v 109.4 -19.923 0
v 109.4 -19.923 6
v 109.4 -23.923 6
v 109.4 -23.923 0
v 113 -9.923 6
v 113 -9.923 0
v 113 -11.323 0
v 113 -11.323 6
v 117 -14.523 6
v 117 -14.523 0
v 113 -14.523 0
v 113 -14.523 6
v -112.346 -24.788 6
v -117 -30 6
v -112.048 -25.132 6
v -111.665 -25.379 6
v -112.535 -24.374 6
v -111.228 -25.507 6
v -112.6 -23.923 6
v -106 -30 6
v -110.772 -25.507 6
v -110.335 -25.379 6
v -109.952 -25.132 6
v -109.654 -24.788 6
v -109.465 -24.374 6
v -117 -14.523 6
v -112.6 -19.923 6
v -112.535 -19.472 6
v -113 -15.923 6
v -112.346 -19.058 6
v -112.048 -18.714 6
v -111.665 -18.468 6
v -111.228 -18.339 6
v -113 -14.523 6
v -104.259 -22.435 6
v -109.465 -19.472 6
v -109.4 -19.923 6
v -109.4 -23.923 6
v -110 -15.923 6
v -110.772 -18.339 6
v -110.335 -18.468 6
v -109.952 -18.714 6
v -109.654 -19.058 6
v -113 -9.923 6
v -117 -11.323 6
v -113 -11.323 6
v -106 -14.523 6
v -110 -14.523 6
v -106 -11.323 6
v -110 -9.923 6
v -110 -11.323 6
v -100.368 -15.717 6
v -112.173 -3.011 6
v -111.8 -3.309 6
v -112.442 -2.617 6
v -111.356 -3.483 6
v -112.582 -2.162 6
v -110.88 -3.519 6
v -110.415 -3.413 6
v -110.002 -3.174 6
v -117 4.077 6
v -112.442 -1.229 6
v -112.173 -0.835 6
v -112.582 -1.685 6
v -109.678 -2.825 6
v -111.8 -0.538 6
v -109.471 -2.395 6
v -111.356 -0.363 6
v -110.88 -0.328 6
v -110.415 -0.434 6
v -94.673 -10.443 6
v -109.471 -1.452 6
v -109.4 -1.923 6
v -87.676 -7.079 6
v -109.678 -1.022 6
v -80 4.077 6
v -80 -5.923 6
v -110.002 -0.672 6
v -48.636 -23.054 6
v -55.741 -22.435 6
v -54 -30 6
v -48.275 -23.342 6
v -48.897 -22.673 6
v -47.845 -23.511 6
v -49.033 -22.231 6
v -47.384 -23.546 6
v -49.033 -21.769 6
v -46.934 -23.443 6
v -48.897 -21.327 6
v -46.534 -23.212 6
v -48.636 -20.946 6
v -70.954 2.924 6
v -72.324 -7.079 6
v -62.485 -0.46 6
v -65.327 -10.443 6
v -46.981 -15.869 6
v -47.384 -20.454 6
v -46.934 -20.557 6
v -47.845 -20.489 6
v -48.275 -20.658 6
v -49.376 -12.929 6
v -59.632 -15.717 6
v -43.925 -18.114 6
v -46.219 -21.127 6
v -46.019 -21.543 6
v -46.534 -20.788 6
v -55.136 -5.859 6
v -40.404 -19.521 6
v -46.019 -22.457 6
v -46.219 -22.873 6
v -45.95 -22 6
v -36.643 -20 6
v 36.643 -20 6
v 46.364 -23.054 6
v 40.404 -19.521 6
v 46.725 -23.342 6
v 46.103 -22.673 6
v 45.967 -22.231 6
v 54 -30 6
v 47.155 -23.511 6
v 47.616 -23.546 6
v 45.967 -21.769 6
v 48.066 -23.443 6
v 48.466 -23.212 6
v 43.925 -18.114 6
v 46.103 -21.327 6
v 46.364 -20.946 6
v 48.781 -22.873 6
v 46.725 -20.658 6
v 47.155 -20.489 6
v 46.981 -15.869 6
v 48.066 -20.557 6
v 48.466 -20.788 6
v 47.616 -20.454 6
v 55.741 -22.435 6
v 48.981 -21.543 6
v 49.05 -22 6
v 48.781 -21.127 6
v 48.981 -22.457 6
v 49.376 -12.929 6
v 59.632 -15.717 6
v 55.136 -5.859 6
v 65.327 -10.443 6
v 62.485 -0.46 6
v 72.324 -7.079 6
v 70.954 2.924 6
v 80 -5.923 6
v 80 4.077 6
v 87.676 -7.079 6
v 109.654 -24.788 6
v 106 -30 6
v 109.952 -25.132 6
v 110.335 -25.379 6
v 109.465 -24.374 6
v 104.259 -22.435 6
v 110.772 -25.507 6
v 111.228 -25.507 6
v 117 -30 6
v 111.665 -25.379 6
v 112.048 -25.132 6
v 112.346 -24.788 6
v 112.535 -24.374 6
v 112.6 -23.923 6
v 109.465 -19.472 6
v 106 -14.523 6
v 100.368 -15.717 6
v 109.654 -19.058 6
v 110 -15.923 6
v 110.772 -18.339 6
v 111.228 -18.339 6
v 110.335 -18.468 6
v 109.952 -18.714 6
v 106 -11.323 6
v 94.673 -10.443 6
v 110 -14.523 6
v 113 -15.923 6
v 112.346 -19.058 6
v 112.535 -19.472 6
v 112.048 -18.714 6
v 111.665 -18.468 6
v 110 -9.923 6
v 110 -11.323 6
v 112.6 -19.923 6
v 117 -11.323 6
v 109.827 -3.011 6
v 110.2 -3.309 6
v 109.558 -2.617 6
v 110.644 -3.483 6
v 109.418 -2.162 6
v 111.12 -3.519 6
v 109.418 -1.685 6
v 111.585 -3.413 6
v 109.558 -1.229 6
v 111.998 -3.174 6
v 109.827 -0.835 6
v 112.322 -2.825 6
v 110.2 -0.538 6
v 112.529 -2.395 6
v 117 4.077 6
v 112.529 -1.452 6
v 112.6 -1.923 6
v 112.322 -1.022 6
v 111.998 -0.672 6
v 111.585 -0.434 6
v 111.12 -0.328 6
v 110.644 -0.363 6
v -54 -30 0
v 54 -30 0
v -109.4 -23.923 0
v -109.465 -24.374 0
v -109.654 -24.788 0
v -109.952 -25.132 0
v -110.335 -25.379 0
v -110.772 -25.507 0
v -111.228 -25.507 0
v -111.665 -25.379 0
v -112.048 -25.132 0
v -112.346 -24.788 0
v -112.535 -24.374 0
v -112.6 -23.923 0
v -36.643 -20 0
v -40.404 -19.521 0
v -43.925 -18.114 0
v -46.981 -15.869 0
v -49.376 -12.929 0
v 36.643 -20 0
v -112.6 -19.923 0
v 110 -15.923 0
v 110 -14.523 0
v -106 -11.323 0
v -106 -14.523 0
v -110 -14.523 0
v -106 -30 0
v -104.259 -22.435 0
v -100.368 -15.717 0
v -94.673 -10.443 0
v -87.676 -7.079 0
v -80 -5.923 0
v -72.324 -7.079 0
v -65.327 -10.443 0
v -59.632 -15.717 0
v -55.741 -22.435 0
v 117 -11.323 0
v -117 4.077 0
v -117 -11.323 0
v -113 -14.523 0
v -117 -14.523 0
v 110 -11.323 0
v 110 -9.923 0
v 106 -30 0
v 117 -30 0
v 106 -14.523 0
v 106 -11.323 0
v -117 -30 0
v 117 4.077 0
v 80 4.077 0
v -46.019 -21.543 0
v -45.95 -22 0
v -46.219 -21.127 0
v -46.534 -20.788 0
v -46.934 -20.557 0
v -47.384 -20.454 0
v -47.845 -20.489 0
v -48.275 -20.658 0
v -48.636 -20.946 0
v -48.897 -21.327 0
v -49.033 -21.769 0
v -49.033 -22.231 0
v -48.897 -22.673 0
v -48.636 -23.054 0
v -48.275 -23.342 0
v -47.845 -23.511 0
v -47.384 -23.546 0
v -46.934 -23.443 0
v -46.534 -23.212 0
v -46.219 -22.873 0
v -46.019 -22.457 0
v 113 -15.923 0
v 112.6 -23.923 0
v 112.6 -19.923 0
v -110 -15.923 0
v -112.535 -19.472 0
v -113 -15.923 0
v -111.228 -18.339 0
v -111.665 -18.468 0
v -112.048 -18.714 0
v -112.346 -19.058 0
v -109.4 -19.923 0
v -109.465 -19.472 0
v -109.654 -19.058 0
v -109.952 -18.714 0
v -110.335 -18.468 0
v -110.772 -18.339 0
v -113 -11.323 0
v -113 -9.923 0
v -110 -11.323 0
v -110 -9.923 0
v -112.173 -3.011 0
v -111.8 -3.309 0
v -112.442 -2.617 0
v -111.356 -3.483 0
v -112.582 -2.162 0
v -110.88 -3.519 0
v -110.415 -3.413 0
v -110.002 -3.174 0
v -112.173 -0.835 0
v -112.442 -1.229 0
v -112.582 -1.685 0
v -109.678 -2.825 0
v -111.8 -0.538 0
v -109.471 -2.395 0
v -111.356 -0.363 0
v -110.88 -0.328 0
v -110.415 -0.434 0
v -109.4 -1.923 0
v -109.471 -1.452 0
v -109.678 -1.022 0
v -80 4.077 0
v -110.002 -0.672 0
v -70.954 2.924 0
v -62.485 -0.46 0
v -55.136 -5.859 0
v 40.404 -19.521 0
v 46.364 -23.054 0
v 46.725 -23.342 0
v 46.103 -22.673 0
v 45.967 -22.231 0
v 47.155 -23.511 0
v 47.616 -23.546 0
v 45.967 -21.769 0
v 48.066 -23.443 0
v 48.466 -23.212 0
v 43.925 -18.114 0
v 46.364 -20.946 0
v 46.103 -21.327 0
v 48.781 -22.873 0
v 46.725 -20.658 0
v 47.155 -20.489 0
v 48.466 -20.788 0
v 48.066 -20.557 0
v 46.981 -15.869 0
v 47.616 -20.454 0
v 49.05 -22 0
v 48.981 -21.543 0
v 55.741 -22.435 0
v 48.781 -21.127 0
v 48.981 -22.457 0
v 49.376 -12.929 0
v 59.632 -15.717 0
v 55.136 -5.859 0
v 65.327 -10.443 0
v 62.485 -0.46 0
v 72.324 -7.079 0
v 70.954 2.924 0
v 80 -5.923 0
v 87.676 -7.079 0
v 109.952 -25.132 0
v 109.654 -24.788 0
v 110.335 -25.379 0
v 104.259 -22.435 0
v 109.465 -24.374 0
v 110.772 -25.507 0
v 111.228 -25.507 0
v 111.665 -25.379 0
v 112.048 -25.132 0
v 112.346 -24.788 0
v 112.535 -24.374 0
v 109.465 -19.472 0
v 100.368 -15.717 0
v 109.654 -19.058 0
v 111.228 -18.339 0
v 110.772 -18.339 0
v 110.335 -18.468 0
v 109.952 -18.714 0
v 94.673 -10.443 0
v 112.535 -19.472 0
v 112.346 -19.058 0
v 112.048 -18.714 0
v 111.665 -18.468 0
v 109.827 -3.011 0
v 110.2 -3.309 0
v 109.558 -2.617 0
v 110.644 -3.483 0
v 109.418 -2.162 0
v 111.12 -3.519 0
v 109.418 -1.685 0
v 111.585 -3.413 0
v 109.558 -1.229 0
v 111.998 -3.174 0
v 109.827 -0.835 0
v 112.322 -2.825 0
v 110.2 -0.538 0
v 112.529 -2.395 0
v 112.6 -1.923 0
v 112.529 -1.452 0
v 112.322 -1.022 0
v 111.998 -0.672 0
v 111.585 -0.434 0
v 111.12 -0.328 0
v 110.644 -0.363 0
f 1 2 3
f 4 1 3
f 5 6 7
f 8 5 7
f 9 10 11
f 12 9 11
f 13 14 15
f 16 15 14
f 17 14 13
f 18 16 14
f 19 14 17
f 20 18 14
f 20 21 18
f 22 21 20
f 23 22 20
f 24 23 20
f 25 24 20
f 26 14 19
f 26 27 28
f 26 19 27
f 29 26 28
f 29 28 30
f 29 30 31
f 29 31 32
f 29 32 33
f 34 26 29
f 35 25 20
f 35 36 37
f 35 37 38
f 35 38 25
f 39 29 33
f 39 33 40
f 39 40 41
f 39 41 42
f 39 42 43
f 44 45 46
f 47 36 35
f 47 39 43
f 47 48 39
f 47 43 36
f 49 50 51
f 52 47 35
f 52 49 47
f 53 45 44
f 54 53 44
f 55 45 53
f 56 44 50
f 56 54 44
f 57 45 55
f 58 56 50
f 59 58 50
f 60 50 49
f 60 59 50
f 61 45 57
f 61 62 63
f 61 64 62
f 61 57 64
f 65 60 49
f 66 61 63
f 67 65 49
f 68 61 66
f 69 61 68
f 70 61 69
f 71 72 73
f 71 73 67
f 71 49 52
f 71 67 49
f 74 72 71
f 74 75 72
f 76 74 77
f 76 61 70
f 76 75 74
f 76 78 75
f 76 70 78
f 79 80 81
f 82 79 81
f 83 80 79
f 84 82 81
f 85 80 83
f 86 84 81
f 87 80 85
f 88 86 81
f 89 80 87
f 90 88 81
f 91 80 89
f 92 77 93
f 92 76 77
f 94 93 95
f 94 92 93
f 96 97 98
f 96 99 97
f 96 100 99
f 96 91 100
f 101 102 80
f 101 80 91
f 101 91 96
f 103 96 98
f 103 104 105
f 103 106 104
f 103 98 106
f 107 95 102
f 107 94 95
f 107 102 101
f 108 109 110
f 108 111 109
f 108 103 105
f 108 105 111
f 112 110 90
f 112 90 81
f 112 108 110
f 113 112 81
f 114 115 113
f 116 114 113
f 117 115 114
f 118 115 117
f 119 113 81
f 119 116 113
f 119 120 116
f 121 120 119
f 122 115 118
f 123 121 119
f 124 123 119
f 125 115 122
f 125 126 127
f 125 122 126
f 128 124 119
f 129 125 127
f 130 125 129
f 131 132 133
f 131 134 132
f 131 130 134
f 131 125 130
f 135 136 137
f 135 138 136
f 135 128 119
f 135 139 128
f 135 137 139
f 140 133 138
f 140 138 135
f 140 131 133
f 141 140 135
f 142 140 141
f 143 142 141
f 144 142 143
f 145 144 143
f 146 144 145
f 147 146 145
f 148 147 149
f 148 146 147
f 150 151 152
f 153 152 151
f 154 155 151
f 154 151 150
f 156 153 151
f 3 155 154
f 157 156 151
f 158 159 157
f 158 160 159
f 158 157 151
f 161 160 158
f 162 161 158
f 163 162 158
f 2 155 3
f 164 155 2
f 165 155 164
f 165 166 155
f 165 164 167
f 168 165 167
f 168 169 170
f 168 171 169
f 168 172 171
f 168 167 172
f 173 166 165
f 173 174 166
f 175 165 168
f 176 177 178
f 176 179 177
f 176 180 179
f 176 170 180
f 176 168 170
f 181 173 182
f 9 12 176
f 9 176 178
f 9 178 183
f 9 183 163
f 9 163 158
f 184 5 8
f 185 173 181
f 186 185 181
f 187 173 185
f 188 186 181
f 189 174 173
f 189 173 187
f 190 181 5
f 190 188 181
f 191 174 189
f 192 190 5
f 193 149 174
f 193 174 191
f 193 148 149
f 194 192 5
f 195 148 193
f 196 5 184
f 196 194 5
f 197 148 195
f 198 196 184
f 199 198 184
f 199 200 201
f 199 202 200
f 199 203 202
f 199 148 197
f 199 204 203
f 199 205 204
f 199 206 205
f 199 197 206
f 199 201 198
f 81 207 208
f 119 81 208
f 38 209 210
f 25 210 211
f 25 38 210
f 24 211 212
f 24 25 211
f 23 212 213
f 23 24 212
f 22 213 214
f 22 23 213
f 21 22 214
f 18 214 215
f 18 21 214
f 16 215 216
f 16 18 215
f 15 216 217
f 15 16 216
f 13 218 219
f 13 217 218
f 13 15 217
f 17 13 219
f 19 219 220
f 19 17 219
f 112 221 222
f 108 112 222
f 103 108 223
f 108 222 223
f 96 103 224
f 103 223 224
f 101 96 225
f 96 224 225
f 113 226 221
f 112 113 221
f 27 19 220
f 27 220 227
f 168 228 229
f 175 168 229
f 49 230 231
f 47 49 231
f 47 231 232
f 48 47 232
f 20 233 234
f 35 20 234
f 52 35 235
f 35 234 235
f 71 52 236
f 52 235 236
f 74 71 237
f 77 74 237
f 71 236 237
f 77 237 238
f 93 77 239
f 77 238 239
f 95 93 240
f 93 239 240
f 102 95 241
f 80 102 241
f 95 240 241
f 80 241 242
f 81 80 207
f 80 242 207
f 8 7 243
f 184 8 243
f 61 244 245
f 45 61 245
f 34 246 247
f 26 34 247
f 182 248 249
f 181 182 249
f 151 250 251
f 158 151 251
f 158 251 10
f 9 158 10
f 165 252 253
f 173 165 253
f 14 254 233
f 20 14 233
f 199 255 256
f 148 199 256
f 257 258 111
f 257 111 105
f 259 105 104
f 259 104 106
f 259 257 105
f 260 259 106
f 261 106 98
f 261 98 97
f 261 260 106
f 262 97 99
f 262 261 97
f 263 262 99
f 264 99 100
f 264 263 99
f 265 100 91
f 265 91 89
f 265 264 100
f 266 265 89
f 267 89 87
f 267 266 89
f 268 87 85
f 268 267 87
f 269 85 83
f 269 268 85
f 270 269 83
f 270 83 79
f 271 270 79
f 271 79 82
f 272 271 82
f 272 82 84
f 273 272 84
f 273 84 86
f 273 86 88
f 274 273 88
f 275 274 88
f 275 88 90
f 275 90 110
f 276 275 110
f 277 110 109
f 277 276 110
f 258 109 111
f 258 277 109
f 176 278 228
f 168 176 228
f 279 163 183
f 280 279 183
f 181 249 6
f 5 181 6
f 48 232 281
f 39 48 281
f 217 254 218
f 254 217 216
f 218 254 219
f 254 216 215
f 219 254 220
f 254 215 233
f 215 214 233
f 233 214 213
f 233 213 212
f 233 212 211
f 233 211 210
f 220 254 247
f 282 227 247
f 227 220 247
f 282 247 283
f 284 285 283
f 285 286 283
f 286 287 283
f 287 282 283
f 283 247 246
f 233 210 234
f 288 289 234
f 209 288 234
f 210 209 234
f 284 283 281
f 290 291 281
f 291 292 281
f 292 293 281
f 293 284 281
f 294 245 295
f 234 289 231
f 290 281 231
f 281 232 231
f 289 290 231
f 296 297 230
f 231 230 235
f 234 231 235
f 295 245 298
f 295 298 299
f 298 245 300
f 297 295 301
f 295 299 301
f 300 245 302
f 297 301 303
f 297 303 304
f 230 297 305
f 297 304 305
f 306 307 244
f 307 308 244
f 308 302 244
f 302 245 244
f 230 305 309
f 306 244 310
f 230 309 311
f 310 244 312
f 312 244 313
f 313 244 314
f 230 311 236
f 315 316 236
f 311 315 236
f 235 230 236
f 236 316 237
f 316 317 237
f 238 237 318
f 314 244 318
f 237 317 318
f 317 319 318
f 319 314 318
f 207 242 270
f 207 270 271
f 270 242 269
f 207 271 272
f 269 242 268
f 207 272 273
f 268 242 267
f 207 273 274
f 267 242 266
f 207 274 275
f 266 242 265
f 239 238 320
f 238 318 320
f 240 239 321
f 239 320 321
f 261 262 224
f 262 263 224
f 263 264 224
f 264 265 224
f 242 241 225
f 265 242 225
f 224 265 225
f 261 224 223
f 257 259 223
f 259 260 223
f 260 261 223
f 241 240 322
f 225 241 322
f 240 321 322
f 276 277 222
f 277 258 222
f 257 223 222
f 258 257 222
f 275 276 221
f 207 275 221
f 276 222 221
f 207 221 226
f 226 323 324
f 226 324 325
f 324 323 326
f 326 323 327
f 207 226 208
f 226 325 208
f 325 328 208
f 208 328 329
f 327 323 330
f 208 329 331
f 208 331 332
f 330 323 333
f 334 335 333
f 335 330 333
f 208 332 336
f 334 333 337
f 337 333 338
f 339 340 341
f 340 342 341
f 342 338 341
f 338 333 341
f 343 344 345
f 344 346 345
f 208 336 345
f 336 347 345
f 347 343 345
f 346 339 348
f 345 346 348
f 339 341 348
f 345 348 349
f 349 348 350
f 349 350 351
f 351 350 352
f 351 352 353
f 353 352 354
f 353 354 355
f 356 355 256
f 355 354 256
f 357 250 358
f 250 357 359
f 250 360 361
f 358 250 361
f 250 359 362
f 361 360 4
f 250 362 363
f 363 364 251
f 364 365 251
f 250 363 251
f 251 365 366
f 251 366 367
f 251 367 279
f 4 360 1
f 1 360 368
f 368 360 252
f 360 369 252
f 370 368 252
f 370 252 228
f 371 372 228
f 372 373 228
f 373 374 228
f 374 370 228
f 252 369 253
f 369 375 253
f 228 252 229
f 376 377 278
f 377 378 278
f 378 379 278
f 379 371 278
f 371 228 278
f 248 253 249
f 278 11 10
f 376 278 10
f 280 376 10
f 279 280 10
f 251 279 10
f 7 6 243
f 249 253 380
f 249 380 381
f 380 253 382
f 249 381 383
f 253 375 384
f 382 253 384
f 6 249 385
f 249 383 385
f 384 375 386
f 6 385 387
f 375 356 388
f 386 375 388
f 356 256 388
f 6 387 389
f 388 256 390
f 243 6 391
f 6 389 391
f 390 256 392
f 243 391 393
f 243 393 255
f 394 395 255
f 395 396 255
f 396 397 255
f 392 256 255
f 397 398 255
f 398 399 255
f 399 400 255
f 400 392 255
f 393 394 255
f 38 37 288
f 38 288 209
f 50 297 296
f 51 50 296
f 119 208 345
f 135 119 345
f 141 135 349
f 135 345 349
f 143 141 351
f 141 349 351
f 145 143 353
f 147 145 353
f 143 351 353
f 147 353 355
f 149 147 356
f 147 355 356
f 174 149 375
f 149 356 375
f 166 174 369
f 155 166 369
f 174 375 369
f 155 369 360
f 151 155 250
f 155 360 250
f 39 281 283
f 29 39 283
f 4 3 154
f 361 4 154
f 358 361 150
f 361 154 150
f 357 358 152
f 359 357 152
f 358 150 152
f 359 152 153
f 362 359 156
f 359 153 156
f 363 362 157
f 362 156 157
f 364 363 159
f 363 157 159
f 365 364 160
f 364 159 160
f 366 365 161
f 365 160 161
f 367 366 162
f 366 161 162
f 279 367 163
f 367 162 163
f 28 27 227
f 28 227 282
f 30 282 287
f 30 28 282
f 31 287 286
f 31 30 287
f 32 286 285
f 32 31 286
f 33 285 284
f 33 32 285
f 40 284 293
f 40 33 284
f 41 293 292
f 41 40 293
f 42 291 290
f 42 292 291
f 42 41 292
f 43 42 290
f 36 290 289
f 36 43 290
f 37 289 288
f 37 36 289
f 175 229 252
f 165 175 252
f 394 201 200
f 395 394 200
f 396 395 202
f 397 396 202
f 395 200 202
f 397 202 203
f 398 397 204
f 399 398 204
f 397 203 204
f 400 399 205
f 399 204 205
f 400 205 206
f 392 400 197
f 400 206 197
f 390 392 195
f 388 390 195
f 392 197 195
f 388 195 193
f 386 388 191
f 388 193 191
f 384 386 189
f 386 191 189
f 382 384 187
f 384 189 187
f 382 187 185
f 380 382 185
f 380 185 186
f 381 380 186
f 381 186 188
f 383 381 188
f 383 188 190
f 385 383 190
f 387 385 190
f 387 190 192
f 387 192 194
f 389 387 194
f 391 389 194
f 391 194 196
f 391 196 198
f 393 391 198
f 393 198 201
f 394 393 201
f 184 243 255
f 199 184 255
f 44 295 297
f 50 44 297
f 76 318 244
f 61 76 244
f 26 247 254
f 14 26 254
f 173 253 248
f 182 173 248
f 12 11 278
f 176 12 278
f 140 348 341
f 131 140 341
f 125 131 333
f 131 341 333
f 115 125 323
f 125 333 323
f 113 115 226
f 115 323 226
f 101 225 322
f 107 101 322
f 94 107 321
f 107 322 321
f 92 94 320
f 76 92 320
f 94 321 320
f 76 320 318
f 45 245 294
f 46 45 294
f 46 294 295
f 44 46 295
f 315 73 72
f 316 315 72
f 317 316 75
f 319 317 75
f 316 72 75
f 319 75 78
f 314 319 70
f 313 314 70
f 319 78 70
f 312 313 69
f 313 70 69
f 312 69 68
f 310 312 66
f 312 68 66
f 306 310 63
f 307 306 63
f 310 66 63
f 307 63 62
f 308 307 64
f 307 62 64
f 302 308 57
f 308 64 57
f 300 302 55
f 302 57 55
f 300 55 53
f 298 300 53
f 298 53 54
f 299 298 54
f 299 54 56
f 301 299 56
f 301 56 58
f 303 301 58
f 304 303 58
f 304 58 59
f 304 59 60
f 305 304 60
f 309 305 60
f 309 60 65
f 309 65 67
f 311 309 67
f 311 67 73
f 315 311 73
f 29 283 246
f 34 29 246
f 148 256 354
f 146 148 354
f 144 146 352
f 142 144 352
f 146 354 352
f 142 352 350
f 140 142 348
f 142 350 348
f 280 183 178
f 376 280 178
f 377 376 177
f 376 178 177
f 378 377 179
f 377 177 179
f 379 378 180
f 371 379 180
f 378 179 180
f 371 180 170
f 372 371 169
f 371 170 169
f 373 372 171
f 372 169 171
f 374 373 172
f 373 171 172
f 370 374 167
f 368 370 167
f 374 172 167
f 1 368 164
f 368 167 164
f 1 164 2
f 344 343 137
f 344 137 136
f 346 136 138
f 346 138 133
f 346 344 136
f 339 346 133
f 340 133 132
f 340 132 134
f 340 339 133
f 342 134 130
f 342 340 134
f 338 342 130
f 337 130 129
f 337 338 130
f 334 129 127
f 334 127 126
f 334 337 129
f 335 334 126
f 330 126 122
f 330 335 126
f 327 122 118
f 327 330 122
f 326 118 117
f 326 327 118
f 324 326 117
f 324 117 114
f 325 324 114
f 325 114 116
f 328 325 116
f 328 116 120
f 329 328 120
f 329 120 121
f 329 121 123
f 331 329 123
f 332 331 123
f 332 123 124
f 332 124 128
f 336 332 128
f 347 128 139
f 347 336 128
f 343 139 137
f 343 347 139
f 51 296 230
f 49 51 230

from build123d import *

# Parameters (mm, degrees)
ESBO_O1_R                = 1.55
RESSALTO_EXTRUS_O1_DEPTH = 6
ESBO_O2_R                = 1.6
CORTE_EXTRUS_O1_DEPTH    = 10


with BuildPart() as part:
    # Esboço1 → Ressalto-extrusão1 (new body)
    with BuildSketch(Plane.XY):
        with BuildLine():
            Line((-117, -30), (-106, -30))
            ThreePointArc((-106, -30), (-80, -5.923190379), (-54, -30))
            Line((-54, -30), (0, -30))
            Line((0, -30), (54, -30))
            ThreePointArc((54, -30), (80, -5.923190379), (106, -30))
            Line((106, -30), (117, -30))
            Line((117, -30), (117, -14.523190379))
            Line((117, -14.523190379), (113, -14.523190379))
            Line((113, -14.523190379), (113, -15.923190379))
            Line((113, -15.923190379), (110, -15.923190379))
            Line((110, -15.923190379), (110, -14.523190379))
            Line((110, -14.523190379), (106, -14.523190379))
            Line((106, -14.523190379), (106, -11.323190379))
            Line((106, -11.323190379), (110, -11.323190379))
            Line((110, -11.323190379), (110, -9.923190379))
            Line((110, -9.923190379), (113, -9.923190379))
            Line((113, -9.923190379), (113, -11.323190379))
            Line((113, -11.323190379), (117, -11.323190379))
            Line((117, -11.323190379), (117, 4.076809621))
            Line((117, 4.076809621), (80, 4.076809621))
            ThreePointArc((80, 4.076809621), (62.485380172, -0.45995744), (49.375792338, -12.929234481))
            ThreePointArc((49.375792338, -12.929234481), (43.925093688, -18.113704991), (36.642872777, -20))
            Line((36.642872777, -20), (-36.642872777, -20))
            ThreePointArc((-36.642872777, -20), (-43.925093688, -18.113704991), (-49.375792338, -12.929234481))
            ThreePointArc((-49.375792338, -12.929234481), (-62.485380172, -0.45995744), (-80, 4.076809621))
            Line((-80, 4.076809621), (-117, 4.076809621))
            Line((-117, 4.076809621), (-117, -11.323190379))
            Line((-117, -11.323190379), (-113, -11.323190379))
            Line((-113, -11.323190379), (-113, -9.923190379))
            Line((-113, -9.923190379), (-110, -9.923190379))
            Line((-110, -9.923190379), (-110, -11.323190379))
            Line((-110, -11.323190379), (-106, -11.323190379))
            Line((-106, -11.323190379), (-106, -14.523190379))
            Line((-106, -14.523190379), (-110, -14.523190379))
            Line((-110, -14.523190379), (-110, -15.923190379))
            Line((-110, -15.923190379), (-113, -15.923190379))
            Line((-113, -15.923190379), (-113, -14.523190379))
            Line((-113, -14.523190379), (-117, -14.523190379))
            Line((-117, -14.523190379), (-117, -30))
        make_face()
        with Locations((-47.5, -22)):
            Circle(ESBO_O1_R, mode=Mode.SUBTRACT)
        with Locations((47.5, -22)):
            Circle(ESBO_O1_R, mode=Mode.SUBTRACT)
    extrude(amount=RESSALTO_EXTRUS_O1_DEPTH)

    # Esboço2 → Corte-extrusão1 (cut)
    with BuildSketch(Plane.XY.offset(6)):
        with Locations((-111, -1.923190379)):
            Circle(ESBO_O2_R)
        with Locations((111, -1.923190379)):
            Circle(ESBO_O2_R)
        with BuildLine():
            Line((-109.4, -19.923190379), (-109.4, -23.923190379))
            ThreePointArc((-109.4, -23.923190379), (-111, -25.523190379), (-112.6, -23.923190379))
            Line((-112.6, -23.923190379), (-112.6, -19.923190379))
            ThreePointArc((-112.6, -19.923190379), (-111, -18.323190379), (-109.4, -19.923190379))
        make_face()
        with BuildLine():
            Line((109.4, -19.923190379), (109.4, -23.923190379))
            ThreePointArc((109.4, -23.923190379), (111, -25.523190379), (112.6, -23.923190379))
            Line((112.6, -23.923190379), (112.6, -19.923190379))
            ThreePointArc((112.6, -19.923190379), (111, -18.323190379), (109.4, -19.923190379))
        make_face()
    extrude(amount=-CORTE_EXTRUS_O1_DEPTH, mode=Mode.SUBTRACT)


solid = part.part
